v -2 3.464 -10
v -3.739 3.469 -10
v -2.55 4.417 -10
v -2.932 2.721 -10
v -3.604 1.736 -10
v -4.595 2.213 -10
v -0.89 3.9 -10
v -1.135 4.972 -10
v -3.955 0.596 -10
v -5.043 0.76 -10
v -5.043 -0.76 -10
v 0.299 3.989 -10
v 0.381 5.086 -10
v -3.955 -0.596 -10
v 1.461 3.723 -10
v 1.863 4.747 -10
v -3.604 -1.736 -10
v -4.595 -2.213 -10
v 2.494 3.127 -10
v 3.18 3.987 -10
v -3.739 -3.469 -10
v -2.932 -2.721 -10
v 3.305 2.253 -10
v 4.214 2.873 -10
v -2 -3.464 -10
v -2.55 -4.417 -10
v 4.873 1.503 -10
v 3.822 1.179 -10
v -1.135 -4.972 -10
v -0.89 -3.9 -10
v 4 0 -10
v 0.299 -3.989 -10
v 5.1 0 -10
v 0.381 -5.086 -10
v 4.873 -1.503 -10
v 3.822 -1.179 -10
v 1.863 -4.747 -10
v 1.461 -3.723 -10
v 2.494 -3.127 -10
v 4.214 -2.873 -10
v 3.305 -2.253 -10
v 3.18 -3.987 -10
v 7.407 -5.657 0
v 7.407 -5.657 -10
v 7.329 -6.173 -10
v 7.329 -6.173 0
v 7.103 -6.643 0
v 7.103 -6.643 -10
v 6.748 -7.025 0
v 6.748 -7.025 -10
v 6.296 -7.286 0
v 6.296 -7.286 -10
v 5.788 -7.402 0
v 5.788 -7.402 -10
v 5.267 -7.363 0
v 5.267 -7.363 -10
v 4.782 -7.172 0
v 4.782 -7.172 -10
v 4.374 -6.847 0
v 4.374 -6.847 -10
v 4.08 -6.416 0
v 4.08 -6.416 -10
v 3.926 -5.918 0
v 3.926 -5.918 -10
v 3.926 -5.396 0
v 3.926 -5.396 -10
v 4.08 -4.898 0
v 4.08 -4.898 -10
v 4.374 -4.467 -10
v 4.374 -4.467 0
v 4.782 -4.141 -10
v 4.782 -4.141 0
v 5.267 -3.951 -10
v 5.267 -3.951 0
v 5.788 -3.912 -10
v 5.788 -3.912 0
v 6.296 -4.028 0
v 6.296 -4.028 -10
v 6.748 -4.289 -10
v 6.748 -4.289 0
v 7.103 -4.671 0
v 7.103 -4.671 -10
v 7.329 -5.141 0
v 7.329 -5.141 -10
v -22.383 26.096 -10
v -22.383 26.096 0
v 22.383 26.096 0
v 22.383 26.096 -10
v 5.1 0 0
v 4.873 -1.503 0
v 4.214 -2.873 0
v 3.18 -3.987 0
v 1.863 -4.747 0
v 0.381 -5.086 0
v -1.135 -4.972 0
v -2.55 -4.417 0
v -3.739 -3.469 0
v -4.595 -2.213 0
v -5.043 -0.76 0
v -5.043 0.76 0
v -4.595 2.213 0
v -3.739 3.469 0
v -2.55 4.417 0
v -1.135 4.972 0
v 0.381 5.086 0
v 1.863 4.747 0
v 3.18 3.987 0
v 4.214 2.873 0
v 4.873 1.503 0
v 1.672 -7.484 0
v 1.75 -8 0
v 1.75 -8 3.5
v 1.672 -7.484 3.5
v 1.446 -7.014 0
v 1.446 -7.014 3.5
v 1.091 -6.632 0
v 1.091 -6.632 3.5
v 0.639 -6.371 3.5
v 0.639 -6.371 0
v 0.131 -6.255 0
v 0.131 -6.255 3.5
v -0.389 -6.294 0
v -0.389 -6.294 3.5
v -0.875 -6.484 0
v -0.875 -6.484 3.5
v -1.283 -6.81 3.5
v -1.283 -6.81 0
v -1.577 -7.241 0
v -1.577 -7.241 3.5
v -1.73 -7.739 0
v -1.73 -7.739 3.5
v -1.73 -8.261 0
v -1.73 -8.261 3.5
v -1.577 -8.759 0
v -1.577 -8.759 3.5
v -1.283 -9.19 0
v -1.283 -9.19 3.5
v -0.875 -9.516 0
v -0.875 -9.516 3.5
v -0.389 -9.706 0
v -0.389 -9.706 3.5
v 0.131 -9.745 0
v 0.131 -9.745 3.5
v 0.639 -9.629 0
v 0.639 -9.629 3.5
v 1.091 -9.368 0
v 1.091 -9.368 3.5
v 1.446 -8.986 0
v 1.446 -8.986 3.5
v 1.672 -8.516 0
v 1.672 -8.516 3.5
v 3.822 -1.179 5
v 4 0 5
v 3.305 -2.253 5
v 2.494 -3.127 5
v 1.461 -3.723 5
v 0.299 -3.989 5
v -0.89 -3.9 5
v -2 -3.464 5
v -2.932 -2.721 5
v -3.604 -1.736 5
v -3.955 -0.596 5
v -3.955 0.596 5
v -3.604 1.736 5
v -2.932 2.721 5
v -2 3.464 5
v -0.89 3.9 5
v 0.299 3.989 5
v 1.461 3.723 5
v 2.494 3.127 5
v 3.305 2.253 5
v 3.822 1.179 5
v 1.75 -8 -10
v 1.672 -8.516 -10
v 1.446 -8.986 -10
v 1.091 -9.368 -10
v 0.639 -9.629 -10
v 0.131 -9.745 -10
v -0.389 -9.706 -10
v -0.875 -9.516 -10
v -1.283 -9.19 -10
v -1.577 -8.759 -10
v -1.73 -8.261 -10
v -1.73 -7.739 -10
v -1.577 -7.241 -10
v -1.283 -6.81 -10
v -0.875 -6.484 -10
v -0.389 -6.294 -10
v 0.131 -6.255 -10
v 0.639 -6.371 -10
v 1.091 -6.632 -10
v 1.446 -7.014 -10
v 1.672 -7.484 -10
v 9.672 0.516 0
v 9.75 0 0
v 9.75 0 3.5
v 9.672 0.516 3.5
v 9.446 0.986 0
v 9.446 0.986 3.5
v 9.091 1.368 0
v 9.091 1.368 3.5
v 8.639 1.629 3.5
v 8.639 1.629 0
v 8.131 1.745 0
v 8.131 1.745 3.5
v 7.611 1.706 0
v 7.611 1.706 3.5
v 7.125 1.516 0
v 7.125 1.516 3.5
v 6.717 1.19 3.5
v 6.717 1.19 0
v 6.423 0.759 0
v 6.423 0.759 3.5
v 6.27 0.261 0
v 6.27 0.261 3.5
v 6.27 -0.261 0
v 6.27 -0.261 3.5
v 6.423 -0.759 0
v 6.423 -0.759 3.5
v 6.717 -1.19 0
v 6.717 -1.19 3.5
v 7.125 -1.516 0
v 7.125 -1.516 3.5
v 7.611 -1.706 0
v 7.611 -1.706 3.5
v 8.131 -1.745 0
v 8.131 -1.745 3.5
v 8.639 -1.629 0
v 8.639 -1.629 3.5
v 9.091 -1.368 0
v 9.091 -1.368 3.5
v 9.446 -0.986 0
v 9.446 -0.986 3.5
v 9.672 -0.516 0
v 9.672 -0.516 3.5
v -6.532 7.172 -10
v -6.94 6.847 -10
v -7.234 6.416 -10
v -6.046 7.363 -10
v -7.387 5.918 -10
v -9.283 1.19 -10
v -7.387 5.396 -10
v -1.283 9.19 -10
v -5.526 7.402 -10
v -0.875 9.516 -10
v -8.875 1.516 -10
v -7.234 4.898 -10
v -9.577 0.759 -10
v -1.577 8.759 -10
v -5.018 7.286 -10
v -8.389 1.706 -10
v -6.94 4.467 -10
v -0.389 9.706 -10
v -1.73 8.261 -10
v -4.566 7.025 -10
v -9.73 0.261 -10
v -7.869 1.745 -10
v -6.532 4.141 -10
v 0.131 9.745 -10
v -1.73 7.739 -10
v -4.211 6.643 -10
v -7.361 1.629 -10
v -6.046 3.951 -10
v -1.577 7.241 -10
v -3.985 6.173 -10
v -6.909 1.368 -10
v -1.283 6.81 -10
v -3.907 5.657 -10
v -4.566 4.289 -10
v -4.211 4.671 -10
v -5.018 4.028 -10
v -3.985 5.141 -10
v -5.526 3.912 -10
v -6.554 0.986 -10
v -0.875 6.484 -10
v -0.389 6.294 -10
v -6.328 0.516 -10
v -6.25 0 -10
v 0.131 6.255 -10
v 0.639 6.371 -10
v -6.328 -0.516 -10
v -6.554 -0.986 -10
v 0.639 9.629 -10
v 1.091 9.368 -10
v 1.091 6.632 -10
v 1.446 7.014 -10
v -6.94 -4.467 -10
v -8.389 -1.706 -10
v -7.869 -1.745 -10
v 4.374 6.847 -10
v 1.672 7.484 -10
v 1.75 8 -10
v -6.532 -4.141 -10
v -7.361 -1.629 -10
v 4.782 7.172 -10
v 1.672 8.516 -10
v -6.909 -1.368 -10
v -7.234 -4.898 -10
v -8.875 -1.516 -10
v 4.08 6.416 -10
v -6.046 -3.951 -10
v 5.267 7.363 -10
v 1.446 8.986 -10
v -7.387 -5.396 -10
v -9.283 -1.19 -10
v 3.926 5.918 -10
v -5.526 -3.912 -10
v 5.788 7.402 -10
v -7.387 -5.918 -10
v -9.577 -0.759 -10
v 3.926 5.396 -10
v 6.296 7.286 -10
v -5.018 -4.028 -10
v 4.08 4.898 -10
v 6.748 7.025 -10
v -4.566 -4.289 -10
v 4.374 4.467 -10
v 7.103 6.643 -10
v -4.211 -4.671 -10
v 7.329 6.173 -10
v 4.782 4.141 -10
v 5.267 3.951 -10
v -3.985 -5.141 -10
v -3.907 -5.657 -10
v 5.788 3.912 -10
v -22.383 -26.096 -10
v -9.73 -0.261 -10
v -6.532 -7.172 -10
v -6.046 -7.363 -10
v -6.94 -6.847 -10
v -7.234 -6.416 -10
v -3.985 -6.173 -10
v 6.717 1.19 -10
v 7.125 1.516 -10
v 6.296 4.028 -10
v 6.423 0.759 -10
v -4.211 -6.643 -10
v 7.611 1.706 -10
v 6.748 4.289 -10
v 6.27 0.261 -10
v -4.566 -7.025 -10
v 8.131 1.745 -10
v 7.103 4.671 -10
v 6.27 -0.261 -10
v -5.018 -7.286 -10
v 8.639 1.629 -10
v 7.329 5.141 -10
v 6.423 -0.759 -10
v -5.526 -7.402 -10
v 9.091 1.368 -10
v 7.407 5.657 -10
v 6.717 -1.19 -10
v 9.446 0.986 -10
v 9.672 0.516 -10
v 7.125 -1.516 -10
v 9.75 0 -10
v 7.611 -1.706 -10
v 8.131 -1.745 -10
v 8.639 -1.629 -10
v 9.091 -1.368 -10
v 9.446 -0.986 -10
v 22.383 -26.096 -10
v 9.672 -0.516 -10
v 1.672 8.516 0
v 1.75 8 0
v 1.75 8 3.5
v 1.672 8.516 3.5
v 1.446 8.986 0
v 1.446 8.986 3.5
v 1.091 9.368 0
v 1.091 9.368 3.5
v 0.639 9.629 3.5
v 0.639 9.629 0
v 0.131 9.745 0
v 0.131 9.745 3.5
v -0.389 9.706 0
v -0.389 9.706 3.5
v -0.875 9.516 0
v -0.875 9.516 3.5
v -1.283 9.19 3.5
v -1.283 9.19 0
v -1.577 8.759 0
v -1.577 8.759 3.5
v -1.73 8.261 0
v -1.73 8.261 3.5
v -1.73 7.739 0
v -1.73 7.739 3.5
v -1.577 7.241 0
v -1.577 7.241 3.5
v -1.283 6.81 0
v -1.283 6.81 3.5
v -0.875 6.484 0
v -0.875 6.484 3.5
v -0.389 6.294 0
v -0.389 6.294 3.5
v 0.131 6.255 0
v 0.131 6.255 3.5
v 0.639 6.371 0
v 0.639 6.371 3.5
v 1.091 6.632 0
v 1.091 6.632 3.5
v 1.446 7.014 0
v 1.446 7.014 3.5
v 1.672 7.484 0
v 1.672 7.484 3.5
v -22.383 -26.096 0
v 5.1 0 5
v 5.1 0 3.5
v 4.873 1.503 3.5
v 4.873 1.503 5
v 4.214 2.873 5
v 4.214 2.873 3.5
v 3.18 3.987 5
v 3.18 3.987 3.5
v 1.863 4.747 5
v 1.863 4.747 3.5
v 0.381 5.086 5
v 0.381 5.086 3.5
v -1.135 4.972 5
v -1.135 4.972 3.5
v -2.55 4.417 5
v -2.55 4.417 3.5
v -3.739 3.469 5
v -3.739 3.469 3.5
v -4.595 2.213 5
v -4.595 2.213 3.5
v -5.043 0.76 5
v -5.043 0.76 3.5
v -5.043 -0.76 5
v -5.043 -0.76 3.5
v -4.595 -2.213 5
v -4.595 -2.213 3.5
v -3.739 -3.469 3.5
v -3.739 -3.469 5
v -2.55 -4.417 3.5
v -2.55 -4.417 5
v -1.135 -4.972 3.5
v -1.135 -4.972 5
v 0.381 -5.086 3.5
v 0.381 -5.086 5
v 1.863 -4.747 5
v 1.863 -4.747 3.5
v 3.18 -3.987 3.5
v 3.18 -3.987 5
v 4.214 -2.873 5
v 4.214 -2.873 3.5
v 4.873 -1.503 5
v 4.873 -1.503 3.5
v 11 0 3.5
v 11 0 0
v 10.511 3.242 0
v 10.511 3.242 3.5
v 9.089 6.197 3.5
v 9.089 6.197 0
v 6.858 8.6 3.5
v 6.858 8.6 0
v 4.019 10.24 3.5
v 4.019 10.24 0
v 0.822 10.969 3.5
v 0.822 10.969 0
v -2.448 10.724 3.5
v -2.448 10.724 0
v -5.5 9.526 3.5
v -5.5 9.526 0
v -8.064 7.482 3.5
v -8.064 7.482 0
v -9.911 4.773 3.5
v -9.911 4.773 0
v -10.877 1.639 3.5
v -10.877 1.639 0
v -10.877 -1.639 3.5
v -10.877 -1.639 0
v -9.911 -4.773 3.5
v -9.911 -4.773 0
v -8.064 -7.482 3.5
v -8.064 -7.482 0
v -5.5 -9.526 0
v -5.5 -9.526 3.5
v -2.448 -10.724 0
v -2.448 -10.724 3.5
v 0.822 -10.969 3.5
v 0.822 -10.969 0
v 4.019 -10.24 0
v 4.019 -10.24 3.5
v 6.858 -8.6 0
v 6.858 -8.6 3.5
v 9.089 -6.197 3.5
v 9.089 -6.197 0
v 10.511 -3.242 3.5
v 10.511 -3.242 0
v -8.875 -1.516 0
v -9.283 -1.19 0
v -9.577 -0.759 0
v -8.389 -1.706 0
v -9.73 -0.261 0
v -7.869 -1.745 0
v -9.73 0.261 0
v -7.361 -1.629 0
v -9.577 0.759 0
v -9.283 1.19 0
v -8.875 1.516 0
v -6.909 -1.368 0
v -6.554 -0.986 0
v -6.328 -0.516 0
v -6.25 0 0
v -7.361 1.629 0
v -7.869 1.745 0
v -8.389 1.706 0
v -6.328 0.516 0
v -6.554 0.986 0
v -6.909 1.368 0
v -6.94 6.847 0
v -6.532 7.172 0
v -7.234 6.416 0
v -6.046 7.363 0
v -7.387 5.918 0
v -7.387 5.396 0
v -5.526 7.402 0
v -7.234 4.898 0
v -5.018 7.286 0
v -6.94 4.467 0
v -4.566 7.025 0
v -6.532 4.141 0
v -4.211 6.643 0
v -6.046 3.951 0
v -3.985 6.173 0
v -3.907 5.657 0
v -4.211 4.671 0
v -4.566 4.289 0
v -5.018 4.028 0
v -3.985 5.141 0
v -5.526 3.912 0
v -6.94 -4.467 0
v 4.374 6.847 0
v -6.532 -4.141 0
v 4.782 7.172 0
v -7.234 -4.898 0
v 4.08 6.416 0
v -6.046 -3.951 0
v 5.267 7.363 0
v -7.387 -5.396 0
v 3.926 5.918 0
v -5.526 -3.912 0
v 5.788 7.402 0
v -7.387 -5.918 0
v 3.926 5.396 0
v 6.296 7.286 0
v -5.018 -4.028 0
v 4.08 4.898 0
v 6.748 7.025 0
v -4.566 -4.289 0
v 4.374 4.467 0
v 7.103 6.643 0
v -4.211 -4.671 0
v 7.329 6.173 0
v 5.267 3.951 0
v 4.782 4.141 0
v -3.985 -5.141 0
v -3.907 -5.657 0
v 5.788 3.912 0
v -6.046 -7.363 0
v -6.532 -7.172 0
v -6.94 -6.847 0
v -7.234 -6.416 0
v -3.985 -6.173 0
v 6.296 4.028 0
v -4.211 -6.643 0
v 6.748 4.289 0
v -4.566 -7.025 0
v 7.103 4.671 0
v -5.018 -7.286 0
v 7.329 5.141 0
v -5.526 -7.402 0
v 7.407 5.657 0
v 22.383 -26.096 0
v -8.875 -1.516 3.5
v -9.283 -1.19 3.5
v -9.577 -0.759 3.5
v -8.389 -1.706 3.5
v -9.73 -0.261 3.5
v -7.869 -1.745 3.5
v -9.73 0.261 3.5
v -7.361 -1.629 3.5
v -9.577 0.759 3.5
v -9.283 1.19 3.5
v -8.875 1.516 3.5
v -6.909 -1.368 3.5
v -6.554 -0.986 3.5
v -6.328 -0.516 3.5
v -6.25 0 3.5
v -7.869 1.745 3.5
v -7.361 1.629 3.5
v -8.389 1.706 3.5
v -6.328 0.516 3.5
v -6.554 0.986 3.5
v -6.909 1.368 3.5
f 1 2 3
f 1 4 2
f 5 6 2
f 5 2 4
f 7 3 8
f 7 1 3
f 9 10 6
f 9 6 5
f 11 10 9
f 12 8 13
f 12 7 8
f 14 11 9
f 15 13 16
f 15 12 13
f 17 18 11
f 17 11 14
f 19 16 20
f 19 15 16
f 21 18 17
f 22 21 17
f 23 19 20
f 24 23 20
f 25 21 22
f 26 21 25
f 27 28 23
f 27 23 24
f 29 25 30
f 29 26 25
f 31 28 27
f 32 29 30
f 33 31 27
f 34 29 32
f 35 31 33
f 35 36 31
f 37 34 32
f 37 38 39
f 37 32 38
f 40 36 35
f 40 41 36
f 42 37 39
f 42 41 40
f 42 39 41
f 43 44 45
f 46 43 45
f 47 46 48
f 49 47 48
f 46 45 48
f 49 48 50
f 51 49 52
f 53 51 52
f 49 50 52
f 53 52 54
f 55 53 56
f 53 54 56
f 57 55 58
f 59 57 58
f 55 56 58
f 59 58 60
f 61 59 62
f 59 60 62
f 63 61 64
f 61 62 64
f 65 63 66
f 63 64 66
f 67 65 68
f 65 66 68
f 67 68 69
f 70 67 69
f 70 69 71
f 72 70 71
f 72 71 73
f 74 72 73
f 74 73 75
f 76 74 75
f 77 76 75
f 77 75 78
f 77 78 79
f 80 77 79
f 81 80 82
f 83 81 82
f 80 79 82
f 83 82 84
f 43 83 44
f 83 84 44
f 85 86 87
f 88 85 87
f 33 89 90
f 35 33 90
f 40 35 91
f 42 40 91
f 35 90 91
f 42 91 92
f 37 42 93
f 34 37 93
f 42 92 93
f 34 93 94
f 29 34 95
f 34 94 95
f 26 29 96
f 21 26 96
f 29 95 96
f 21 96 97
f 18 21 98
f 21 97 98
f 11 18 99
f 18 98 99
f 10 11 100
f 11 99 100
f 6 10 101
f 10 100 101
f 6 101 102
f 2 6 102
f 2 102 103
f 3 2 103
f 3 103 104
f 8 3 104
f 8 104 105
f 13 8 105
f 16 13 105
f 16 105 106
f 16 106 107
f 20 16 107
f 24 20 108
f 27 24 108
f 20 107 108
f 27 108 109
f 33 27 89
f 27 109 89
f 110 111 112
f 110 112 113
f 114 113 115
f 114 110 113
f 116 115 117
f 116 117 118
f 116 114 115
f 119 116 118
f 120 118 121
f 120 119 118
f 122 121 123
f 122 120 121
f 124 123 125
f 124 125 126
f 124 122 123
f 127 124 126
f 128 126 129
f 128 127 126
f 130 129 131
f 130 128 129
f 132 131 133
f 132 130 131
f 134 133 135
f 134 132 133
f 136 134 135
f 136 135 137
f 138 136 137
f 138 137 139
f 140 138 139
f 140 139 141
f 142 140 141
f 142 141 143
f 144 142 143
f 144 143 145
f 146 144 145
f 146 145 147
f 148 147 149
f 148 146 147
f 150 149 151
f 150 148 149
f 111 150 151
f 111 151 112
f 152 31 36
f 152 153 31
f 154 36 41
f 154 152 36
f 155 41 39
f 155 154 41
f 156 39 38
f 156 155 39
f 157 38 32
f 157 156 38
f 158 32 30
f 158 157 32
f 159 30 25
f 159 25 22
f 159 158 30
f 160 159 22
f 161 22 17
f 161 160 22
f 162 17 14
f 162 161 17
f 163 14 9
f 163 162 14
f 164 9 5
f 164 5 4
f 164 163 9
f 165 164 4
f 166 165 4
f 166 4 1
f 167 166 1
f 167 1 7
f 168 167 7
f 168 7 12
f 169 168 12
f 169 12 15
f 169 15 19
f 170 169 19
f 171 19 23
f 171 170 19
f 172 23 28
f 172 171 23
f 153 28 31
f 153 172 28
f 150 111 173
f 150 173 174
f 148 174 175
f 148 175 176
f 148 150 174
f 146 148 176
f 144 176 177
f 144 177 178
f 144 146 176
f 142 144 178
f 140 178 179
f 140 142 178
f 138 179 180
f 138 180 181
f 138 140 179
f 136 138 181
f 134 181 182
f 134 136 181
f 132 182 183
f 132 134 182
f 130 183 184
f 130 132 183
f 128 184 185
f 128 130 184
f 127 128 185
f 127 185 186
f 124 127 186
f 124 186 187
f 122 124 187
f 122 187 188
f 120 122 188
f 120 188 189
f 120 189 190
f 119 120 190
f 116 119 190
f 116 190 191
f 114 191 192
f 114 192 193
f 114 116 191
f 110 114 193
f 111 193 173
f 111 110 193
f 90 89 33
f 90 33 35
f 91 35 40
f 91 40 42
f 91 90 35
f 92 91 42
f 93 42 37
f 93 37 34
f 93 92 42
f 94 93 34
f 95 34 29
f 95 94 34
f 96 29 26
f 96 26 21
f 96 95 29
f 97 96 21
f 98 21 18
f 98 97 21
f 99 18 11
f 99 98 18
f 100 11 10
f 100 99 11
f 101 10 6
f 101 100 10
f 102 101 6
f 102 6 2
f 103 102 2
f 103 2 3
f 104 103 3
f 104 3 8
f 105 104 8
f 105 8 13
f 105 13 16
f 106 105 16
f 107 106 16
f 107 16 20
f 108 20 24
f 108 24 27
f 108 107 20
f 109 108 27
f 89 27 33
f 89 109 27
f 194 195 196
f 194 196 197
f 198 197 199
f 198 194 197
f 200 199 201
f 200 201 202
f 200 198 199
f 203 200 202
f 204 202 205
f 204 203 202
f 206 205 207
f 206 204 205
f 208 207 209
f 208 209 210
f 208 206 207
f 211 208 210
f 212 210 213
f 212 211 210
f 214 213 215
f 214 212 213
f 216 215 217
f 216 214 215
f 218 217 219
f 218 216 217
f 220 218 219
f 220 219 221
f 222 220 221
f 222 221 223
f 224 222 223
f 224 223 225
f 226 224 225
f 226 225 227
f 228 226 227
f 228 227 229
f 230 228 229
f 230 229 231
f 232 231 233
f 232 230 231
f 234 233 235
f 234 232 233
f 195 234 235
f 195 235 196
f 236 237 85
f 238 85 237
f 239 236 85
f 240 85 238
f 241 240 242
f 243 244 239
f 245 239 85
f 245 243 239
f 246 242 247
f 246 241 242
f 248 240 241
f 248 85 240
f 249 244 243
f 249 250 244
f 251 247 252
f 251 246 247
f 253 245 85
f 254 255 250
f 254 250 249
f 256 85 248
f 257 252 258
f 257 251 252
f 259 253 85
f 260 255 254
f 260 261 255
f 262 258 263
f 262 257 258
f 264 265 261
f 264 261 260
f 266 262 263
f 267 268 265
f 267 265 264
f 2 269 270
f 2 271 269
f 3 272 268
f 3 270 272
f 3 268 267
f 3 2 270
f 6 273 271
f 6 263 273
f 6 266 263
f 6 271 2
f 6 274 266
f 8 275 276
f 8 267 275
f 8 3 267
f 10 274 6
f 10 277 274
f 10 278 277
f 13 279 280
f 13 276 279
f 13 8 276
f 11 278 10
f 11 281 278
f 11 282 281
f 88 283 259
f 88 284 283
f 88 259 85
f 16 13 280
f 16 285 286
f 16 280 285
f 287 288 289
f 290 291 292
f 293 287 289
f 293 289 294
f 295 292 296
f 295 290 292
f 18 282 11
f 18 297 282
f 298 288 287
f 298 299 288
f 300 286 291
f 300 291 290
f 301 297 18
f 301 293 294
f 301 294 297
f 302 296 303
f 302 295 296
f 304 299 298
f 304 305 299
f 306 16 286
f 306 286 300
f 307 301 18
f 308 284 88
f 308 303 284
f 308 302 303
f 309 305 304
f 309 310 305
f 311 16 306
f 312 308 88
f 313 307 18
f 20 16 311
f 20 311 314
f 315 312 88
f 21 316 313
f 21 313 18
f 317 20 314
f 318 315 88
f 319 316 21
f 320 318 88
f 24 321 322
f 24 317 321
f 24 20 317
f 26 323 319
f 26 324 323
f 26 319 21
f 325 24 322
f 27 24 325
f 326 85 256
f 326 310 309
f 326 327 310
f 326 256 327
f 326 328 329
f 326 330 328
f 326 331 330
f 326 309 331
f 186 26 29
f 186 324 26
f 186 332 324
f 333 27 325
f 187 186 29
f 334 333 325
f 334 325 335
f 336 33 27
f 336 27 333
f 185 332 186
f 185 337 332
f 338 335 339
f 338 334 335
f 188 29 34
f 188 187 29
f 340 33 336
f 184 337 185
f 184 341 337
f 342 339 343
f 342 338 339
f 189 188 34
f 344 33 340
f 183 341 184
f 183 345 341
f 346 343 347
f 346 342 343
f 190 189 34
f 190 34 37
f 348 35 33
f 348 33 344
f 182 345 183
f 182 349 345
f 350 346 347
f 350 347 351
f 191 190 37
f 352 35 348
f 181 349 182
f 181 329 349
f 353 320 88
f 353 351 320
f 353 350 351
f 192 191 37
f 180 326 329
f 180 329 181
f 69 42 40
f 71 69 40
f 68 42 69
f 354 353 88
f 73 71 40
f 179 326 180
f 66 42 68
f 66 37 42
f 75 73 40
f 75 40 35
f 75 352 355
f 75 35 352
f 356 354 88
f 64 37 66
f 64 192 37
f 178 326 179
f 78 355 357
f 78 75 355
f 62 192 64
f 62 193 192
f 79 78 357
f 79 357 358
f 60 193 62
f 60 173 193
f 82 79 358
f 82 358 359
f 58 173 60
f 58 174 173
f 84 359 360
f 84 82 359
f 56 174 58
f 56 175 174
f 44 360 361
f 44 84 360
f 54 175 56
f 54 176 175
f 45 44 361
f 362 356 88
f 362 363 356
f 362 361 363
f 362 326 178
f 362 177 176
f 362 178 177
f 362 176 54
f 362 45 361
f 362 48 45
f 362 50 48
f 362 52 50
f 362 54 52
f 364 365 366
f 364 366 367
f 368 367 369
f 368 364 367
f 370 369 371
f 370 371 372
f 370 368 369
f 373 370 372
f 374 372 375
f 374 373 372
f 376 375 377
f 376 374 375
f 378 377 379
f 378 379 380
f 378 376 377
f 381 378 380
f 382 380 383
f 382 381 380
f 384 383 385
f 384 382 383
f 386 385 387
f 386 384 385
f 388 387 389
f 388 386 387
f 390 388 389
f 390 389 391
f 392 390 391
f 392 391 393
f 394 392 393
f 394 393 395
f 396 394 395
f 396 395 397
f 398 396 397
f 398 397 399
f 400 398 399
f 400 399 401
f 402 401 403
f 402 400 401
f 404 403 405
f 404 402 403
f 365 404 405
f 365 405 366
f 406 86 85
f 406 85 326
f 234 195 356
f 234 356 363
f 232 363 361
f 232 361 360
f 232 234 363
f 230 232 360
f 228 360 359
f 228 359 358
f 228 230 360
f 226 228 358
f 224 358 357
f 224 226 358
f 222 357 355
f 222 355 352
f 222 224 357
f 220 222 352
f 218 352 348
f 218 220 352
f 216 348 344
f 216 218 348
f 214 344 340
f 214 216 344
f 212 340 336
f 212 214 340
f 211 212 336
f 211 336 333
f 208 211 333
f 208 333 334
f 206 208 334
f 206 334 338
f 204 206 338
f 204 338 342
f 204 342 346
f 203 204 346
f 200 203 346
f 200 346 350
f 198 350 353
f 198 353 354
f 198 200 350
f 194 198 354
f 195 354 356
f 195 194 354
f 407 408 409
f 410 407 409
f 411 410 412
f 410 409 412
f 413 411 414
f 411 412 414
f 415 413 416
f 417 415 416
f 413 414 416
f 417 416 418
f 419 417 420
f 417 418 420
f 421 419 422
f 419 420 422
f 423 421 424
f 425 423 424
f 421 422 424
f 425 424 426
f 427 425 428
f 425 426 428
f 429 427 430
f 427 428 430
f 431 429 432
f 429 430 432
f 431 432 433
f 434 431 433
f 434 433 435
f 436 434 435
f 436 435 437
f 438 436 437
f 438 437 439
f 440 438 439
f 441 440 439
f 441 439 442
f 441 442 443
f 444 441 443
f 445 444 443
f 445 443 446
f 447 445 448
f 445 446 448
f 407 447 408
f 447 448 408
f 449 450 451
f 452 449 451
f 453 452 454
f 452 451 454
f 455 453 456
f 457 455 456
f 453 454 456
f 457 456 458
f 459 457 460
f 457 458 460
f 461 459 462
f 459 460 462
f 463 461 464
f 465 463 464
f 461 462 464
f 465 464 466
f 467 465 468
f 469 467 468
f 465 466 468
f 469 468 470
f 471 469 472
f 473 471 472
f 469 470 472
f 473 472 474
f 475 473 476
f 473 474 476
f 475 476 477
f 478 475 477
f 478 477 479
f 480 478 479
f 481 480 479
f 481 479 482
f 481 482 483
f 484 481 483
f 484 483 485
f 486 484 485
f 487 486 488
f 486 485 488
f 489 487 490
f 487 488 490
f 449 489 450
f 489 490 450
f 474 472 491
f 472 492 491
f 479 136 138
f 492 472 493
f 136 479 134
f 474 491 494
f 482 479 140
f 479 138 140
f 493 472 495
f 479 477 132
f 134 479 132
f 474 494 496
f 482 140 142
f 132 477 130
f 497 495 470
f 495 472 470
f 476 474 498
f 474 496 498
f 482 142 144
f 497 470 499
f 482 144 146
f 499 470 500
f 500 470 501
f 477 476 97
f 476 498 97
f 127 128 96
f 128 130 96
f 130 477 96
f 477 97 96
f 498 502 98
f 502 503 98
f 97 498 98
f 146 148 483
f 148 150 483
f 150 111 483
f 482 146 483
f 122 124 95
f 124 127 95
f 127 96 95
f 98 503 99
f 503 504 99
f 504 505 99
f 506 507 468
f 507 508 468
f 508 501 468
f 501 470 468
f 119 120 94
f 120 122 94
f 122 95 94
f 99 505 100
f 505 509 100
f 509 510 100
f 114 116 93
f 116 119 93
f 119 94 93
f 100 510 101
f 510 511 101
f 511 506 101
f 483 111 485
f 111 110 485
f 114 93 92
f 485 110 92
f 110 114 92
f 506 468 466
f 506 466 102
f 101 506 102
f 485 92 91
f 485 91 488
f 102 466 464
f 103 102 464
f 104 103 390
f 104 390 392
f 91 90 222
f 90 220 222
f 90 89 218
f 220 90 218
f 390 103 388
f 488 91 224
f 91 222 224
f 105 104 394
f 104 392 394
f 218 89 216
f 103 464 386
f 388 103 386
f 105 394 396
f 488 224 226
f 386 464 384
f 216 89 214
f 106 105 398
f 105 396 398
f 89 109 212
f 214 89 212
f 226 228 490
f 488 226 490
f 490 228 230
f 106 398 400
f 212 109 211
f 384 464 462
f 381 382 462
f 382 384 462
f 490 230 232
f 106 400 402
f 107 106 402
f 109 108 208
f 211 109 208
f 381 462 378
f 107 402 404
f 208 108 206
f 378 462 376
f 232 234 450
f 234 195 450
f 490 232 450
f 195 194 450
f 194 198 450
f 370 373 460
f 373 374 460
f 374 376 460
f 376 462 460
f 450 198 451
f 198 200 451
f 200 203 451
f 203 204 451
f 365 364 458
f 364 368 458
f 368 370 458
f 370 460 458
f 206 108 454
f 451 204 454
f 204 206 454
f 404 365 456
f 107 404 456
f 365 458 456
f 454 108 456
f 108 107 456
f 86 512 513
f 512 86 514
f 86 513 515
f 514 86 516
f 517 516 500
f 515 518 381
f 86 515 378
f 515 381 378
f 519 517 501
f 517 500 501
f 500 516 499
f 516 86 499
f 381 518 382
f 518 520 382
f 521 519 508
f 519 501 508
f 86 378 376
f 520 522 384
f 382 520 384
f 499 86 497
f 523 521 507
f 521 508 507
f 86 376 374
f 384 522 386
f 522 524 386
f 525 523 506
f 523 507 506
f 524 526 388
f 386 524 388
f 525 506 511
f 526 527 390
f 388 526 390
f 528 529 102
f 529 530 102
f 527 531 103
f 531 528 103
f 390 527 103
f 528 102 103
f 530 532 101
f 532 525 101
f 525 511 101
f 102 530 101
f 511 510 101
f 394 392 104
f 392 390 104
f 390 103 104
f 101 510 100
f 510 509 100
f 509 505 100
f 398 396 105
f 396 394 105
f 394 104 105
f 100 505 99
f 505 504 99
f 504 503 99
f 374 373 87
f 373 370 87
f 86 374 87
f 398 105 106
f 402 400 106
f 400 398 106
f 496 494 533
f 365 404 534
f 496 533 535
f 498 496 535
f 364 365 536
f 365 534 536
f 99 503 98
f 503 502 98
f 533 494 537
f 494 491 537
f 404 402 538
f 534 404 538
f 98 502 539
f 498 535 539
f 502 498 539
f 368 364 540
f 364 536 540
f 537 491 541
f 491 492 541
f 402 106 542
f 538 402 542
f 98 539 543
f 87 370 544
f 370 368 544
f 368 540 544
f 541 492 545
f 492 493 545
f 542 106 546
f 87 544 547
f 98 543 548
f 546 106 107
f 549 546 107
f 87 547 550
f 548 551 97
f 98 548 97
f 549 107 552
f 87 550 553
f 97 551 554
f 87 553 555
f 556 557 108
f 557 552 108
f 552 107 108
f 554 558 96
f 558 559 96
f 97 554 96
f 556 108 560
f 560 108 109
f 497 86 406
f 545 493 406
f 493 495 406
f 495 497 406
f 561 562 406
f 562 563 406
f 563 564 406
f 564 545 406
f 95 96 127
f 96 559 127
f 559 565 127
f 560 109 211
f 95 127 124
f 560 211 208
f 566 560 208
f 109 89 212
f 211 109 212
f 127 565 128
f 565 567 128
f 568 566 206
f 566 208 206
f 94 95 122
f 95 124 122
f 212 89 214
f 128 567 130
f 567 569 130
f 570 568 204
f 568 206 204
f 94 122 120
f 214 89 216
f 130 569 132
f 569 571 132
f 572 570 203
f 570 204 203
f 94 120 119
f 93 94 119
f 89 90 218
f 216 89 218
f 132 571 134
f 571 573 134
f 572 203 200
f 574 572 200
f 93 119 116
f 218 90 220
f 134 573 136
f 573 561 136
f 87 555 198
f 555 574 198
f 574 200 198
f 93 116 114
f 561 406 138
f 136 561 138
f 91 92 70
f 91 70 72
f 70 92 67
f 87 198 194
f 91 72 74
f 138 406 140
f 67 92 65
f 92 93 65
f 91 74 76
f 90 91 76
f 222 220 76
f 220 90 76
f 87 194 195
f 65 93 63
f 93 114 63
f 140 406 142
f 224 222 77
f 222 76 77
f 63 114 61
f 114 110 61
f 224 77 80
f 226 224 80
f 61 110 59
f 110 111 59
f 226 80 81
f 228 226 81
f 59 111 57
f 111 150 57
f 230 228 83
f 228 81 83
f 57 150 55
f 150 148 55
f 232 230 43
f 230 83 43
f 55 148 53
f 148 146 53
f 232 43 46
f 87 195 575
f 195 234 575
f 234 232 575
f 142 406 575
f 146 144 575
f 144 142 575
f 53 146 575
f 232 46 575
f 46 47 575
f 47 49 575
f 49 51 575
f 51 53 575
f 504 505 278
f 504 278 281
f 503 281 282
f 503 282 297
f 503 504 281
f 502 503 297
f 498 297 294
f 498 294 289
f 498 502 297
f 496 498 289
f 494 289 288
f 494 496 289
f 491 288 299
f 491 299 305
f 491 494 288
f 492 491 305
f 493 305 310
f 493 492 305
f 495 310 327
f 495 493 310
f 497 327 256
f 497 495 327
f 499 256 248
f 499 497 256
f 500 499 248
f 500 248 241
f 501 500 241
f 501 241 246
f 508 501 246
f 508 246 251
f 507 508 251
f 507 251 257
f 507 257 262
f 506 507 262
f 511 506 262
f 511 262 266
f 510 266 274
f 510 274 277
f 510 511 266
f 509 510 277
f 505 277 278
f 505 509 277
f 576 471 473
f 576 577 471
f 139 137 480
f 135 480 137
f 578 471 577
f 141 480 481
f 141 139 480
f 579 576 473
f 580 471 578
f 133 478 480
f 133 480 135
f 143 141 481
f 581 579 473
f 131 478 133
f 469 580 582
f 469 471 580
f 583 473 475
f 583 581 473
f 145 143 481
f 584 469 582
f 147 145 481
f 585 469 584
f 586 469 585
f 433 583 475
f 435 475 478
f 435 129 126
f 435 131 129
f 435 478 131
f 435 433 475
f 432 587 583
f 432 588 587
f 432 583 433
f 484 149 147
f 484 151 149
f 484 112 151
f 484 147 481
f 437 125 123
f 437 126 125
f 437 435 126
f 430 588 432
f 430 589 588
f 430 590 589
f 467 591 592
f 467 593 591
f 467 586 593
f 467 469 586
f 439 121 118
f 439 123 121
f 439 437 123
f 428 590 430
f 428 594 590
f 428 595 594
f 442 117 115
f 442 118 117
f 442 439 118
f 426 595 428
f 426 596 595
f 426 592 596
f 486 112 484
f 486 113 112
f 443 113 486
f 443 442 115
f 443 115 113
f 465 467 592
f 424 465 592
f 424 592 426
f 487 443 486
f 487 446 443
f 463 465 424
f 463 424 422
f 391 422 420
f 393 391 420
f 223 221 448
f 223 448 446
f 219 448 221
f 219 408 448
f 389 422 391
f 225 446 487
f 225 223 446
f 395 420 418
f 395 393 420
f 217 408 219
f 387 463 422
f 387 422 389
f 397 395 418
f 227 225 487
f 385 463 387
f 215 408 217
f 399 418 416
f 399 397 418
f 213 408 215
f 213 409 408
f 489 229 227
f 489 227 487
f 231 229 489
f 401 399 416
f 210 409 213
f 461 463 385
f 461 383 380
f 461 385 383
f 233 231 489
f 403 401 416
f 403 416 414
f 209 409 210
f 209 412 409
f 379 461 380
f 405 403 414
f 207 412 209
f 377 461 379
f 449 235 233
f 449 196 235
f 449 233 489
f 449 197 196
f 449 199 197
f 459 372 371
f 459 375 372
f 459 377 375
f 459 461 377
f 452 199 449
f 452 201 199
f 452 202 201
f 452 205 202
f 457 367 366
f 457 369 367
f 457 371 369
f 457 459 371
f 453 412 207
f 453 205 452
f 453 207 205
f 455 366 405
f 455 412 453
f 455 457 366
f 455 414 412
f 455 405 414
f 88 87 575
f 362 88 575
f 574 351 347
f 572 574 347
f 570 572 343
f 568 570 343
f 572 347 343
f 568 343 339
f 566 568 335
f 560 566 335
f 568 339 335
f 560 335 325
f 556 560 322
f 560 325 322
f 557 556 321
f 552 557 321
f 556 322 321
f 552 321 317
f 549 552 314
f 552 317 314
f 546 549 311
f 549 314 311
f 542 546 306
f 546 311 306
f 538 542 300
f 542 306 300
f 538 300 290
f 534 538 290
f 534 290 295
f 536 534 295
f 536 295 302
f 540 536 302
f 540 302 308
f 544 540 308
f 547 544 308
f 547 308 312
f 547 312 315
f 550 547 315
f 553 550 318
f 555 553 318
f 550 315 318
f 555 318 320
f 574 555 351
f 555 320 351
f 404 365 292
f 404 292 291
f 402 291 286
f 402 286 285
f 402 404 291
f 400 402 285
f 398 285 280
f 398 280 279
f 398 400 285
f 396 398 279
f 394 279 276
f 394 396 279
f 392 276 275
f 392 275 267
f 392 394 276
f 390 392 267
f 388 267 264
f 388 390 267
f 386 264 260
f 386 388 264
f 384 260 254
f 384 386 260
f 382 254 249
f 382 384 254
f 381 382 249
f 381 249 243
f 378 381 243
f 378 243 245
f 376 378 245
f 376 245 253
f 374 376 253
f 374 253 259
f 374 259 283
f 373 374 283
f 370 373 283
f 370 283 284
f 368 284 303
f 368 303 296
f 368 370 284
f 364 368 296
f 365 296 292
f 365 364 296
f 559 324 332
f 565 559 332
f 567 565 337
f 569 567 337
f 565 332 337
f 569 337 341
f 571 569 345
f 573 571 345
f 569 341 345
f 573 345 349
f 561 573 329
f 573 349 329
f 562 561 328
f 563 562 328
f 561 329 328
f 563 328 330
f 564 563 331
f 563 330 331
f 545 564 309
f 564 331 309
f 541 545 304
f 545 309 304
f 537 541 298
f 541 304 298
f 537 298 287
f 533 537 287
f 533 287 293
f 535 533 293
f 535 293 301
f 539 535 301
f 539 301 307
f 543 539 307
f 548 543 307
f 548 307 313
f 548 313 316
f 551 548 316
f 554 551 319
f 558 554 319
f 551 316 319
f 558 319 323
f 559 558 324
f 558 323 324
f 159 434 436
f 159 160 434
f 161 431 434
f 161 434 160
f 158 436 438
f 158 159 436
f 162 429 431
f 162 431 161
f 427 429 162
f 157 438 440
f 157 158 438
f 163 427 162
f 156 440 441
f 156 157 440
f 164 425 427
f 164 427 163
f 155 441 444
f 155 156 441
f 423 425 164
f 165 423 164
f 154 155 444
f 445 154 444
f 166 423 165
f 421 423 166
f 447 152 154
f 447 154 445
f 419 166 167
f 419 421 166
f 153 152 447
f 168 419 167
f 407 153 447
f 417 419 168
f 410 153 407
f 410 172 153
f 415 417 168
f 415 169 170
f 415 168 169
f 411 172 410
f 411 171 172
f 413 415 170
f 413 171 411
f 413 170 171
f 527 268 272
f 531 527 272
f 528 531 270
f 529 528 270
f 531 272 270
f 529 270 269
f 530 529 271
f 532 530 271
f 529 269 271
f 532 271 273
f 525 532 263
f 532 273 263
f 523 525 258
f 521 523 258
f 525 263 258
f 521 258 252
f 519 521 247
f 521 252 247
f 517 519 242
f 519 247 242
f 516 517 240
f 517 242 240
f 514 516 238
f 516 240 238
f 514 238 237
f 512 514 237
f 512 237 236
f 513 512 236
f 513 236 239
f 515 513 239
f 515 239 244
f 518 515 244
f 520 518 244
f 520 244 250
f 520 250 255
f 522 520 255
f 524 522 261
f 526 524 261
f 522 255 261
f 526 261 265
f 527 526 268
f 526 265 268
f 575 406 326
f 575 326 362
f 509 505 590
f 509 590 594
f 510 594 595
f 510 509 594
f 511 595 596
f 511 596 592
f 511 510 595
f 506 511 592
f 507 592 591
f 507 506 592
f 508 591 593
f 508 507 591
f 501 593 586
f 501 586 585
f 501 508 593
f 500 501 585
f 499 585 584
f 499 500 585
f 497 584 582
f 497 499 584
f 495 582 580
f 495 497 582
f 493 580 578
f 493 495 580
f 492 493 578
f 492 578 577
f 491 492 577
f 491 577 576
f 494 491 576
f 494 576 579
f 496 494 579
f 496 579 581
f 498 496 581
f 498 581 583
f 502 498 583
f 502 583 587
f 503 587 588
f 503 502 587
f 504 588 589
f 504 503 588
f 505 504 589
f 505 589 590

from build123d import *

# Parameters (mm, degrees)
F0_R     = 11
F0_R_2   = 1.75
F0_R_3   = 4
F1_DEPTH = 3.5
F2_R     = 5.1
F2_R_2   = 4
F3_DEPTH = 1.5
F4_R     = 5.1
F4_R_2   = 4
F5_DEPTH = 10
F6_W     = 44.766356
F6_H     = 52.191592
F6_R     = 1.75
F6_R_2   = 5.1
F7_DEPTH = 10
F8_R     = 1.75
F9_DEPTH = 10


with BuildPart() as f1:
    # F0 (on Top) → F1 (new body)
    with BuildSketch(Plane.XY):
        Circle(F0_R)
        with Locations((0, -8)):
            Circle(F0_R_2, mode=Mode.SUBTRACT)
        with Locations((-8, 0)):
            Circle(F0_R_2, mode=Mode.SUBTRACT)
        Circle(F0_R_3, mode=Mode.SUBTRACT)
        with Locations((8, 0)):
            Circle(F0_R_2, mode=Mode.SUBTRACT)
        with Locations((0, 8)):
            Circle(F0_R_2, mode=Mode.SUBTRACT)
    extrude(amount=F1_DEPTH)

    # F2 (on face) → F3 (join)
    with BuildSketch(Plane.XY.offset(3.5)):
        Circle(F2_R)
        Circle(F2_R_2, mode=Mode.SUBTRACT)
    extrude(amount=F3_DEPTH)

    # F4 (on face) → F5 (join)
    with BuildSketch(Plane(origin=(0, 0, 0), x_dir=(1, 0, 0), z_dir=(0, 0, -1))):
        Circle(F4_R)
        Circle(F4_R_2, mode=Mode.SUBTRACT)
    extrude(amount=F5_DEPTH)


with BuildPart() as f7:
    # F6 (on face) → F7 (new body)
    with BuildSketch(Plane(origin=(0, 0, 0), x_dir=(1, 0, 0), z_dir=(0, 0, -1))):
        Rectangle(F6_W, F6_H)
        with Locations((0, -8)):
            Circle(F6_R, mode=Mode.SUBTRACT)
        with Locations((-8, 0)):
            Circle(F6_R, mode=Mode.SUBTRACT)
        Circle(F6_R_2, mode=Mode.SUBTRACT)
        with Locations((8, 0)):
            Circle(F6_R, mode=Mode.SUBTRACT)
        with Locations((0, 8)):
            Circle(F6_R, mode=Mode.SUBTRACT)
    extrude(amount=F7_DEPTH)

    # F8 (on face) → F9 (cut)
    with BuildSketch(Plane(origin=(0, 0, -10), x_dir=(1, 0, 0), z_dir=(0, 0, -1))):
        with Locations((-5.656854, 5.656854)):
            Circle(F8_R)
        with Locations((5.656854, 5.656854)):
            Circle(F8_R)
        with Locations((5.656854, -5.656854)):
            Circle(F8_R)
        with Locations((-5.656854, -5.656854)):
            Circle(F8_R)
    extrude(amount=-F9_DEPTH, mode=Mode.SUBTRACT)


solid = Compound([f1.part, f7.part])
